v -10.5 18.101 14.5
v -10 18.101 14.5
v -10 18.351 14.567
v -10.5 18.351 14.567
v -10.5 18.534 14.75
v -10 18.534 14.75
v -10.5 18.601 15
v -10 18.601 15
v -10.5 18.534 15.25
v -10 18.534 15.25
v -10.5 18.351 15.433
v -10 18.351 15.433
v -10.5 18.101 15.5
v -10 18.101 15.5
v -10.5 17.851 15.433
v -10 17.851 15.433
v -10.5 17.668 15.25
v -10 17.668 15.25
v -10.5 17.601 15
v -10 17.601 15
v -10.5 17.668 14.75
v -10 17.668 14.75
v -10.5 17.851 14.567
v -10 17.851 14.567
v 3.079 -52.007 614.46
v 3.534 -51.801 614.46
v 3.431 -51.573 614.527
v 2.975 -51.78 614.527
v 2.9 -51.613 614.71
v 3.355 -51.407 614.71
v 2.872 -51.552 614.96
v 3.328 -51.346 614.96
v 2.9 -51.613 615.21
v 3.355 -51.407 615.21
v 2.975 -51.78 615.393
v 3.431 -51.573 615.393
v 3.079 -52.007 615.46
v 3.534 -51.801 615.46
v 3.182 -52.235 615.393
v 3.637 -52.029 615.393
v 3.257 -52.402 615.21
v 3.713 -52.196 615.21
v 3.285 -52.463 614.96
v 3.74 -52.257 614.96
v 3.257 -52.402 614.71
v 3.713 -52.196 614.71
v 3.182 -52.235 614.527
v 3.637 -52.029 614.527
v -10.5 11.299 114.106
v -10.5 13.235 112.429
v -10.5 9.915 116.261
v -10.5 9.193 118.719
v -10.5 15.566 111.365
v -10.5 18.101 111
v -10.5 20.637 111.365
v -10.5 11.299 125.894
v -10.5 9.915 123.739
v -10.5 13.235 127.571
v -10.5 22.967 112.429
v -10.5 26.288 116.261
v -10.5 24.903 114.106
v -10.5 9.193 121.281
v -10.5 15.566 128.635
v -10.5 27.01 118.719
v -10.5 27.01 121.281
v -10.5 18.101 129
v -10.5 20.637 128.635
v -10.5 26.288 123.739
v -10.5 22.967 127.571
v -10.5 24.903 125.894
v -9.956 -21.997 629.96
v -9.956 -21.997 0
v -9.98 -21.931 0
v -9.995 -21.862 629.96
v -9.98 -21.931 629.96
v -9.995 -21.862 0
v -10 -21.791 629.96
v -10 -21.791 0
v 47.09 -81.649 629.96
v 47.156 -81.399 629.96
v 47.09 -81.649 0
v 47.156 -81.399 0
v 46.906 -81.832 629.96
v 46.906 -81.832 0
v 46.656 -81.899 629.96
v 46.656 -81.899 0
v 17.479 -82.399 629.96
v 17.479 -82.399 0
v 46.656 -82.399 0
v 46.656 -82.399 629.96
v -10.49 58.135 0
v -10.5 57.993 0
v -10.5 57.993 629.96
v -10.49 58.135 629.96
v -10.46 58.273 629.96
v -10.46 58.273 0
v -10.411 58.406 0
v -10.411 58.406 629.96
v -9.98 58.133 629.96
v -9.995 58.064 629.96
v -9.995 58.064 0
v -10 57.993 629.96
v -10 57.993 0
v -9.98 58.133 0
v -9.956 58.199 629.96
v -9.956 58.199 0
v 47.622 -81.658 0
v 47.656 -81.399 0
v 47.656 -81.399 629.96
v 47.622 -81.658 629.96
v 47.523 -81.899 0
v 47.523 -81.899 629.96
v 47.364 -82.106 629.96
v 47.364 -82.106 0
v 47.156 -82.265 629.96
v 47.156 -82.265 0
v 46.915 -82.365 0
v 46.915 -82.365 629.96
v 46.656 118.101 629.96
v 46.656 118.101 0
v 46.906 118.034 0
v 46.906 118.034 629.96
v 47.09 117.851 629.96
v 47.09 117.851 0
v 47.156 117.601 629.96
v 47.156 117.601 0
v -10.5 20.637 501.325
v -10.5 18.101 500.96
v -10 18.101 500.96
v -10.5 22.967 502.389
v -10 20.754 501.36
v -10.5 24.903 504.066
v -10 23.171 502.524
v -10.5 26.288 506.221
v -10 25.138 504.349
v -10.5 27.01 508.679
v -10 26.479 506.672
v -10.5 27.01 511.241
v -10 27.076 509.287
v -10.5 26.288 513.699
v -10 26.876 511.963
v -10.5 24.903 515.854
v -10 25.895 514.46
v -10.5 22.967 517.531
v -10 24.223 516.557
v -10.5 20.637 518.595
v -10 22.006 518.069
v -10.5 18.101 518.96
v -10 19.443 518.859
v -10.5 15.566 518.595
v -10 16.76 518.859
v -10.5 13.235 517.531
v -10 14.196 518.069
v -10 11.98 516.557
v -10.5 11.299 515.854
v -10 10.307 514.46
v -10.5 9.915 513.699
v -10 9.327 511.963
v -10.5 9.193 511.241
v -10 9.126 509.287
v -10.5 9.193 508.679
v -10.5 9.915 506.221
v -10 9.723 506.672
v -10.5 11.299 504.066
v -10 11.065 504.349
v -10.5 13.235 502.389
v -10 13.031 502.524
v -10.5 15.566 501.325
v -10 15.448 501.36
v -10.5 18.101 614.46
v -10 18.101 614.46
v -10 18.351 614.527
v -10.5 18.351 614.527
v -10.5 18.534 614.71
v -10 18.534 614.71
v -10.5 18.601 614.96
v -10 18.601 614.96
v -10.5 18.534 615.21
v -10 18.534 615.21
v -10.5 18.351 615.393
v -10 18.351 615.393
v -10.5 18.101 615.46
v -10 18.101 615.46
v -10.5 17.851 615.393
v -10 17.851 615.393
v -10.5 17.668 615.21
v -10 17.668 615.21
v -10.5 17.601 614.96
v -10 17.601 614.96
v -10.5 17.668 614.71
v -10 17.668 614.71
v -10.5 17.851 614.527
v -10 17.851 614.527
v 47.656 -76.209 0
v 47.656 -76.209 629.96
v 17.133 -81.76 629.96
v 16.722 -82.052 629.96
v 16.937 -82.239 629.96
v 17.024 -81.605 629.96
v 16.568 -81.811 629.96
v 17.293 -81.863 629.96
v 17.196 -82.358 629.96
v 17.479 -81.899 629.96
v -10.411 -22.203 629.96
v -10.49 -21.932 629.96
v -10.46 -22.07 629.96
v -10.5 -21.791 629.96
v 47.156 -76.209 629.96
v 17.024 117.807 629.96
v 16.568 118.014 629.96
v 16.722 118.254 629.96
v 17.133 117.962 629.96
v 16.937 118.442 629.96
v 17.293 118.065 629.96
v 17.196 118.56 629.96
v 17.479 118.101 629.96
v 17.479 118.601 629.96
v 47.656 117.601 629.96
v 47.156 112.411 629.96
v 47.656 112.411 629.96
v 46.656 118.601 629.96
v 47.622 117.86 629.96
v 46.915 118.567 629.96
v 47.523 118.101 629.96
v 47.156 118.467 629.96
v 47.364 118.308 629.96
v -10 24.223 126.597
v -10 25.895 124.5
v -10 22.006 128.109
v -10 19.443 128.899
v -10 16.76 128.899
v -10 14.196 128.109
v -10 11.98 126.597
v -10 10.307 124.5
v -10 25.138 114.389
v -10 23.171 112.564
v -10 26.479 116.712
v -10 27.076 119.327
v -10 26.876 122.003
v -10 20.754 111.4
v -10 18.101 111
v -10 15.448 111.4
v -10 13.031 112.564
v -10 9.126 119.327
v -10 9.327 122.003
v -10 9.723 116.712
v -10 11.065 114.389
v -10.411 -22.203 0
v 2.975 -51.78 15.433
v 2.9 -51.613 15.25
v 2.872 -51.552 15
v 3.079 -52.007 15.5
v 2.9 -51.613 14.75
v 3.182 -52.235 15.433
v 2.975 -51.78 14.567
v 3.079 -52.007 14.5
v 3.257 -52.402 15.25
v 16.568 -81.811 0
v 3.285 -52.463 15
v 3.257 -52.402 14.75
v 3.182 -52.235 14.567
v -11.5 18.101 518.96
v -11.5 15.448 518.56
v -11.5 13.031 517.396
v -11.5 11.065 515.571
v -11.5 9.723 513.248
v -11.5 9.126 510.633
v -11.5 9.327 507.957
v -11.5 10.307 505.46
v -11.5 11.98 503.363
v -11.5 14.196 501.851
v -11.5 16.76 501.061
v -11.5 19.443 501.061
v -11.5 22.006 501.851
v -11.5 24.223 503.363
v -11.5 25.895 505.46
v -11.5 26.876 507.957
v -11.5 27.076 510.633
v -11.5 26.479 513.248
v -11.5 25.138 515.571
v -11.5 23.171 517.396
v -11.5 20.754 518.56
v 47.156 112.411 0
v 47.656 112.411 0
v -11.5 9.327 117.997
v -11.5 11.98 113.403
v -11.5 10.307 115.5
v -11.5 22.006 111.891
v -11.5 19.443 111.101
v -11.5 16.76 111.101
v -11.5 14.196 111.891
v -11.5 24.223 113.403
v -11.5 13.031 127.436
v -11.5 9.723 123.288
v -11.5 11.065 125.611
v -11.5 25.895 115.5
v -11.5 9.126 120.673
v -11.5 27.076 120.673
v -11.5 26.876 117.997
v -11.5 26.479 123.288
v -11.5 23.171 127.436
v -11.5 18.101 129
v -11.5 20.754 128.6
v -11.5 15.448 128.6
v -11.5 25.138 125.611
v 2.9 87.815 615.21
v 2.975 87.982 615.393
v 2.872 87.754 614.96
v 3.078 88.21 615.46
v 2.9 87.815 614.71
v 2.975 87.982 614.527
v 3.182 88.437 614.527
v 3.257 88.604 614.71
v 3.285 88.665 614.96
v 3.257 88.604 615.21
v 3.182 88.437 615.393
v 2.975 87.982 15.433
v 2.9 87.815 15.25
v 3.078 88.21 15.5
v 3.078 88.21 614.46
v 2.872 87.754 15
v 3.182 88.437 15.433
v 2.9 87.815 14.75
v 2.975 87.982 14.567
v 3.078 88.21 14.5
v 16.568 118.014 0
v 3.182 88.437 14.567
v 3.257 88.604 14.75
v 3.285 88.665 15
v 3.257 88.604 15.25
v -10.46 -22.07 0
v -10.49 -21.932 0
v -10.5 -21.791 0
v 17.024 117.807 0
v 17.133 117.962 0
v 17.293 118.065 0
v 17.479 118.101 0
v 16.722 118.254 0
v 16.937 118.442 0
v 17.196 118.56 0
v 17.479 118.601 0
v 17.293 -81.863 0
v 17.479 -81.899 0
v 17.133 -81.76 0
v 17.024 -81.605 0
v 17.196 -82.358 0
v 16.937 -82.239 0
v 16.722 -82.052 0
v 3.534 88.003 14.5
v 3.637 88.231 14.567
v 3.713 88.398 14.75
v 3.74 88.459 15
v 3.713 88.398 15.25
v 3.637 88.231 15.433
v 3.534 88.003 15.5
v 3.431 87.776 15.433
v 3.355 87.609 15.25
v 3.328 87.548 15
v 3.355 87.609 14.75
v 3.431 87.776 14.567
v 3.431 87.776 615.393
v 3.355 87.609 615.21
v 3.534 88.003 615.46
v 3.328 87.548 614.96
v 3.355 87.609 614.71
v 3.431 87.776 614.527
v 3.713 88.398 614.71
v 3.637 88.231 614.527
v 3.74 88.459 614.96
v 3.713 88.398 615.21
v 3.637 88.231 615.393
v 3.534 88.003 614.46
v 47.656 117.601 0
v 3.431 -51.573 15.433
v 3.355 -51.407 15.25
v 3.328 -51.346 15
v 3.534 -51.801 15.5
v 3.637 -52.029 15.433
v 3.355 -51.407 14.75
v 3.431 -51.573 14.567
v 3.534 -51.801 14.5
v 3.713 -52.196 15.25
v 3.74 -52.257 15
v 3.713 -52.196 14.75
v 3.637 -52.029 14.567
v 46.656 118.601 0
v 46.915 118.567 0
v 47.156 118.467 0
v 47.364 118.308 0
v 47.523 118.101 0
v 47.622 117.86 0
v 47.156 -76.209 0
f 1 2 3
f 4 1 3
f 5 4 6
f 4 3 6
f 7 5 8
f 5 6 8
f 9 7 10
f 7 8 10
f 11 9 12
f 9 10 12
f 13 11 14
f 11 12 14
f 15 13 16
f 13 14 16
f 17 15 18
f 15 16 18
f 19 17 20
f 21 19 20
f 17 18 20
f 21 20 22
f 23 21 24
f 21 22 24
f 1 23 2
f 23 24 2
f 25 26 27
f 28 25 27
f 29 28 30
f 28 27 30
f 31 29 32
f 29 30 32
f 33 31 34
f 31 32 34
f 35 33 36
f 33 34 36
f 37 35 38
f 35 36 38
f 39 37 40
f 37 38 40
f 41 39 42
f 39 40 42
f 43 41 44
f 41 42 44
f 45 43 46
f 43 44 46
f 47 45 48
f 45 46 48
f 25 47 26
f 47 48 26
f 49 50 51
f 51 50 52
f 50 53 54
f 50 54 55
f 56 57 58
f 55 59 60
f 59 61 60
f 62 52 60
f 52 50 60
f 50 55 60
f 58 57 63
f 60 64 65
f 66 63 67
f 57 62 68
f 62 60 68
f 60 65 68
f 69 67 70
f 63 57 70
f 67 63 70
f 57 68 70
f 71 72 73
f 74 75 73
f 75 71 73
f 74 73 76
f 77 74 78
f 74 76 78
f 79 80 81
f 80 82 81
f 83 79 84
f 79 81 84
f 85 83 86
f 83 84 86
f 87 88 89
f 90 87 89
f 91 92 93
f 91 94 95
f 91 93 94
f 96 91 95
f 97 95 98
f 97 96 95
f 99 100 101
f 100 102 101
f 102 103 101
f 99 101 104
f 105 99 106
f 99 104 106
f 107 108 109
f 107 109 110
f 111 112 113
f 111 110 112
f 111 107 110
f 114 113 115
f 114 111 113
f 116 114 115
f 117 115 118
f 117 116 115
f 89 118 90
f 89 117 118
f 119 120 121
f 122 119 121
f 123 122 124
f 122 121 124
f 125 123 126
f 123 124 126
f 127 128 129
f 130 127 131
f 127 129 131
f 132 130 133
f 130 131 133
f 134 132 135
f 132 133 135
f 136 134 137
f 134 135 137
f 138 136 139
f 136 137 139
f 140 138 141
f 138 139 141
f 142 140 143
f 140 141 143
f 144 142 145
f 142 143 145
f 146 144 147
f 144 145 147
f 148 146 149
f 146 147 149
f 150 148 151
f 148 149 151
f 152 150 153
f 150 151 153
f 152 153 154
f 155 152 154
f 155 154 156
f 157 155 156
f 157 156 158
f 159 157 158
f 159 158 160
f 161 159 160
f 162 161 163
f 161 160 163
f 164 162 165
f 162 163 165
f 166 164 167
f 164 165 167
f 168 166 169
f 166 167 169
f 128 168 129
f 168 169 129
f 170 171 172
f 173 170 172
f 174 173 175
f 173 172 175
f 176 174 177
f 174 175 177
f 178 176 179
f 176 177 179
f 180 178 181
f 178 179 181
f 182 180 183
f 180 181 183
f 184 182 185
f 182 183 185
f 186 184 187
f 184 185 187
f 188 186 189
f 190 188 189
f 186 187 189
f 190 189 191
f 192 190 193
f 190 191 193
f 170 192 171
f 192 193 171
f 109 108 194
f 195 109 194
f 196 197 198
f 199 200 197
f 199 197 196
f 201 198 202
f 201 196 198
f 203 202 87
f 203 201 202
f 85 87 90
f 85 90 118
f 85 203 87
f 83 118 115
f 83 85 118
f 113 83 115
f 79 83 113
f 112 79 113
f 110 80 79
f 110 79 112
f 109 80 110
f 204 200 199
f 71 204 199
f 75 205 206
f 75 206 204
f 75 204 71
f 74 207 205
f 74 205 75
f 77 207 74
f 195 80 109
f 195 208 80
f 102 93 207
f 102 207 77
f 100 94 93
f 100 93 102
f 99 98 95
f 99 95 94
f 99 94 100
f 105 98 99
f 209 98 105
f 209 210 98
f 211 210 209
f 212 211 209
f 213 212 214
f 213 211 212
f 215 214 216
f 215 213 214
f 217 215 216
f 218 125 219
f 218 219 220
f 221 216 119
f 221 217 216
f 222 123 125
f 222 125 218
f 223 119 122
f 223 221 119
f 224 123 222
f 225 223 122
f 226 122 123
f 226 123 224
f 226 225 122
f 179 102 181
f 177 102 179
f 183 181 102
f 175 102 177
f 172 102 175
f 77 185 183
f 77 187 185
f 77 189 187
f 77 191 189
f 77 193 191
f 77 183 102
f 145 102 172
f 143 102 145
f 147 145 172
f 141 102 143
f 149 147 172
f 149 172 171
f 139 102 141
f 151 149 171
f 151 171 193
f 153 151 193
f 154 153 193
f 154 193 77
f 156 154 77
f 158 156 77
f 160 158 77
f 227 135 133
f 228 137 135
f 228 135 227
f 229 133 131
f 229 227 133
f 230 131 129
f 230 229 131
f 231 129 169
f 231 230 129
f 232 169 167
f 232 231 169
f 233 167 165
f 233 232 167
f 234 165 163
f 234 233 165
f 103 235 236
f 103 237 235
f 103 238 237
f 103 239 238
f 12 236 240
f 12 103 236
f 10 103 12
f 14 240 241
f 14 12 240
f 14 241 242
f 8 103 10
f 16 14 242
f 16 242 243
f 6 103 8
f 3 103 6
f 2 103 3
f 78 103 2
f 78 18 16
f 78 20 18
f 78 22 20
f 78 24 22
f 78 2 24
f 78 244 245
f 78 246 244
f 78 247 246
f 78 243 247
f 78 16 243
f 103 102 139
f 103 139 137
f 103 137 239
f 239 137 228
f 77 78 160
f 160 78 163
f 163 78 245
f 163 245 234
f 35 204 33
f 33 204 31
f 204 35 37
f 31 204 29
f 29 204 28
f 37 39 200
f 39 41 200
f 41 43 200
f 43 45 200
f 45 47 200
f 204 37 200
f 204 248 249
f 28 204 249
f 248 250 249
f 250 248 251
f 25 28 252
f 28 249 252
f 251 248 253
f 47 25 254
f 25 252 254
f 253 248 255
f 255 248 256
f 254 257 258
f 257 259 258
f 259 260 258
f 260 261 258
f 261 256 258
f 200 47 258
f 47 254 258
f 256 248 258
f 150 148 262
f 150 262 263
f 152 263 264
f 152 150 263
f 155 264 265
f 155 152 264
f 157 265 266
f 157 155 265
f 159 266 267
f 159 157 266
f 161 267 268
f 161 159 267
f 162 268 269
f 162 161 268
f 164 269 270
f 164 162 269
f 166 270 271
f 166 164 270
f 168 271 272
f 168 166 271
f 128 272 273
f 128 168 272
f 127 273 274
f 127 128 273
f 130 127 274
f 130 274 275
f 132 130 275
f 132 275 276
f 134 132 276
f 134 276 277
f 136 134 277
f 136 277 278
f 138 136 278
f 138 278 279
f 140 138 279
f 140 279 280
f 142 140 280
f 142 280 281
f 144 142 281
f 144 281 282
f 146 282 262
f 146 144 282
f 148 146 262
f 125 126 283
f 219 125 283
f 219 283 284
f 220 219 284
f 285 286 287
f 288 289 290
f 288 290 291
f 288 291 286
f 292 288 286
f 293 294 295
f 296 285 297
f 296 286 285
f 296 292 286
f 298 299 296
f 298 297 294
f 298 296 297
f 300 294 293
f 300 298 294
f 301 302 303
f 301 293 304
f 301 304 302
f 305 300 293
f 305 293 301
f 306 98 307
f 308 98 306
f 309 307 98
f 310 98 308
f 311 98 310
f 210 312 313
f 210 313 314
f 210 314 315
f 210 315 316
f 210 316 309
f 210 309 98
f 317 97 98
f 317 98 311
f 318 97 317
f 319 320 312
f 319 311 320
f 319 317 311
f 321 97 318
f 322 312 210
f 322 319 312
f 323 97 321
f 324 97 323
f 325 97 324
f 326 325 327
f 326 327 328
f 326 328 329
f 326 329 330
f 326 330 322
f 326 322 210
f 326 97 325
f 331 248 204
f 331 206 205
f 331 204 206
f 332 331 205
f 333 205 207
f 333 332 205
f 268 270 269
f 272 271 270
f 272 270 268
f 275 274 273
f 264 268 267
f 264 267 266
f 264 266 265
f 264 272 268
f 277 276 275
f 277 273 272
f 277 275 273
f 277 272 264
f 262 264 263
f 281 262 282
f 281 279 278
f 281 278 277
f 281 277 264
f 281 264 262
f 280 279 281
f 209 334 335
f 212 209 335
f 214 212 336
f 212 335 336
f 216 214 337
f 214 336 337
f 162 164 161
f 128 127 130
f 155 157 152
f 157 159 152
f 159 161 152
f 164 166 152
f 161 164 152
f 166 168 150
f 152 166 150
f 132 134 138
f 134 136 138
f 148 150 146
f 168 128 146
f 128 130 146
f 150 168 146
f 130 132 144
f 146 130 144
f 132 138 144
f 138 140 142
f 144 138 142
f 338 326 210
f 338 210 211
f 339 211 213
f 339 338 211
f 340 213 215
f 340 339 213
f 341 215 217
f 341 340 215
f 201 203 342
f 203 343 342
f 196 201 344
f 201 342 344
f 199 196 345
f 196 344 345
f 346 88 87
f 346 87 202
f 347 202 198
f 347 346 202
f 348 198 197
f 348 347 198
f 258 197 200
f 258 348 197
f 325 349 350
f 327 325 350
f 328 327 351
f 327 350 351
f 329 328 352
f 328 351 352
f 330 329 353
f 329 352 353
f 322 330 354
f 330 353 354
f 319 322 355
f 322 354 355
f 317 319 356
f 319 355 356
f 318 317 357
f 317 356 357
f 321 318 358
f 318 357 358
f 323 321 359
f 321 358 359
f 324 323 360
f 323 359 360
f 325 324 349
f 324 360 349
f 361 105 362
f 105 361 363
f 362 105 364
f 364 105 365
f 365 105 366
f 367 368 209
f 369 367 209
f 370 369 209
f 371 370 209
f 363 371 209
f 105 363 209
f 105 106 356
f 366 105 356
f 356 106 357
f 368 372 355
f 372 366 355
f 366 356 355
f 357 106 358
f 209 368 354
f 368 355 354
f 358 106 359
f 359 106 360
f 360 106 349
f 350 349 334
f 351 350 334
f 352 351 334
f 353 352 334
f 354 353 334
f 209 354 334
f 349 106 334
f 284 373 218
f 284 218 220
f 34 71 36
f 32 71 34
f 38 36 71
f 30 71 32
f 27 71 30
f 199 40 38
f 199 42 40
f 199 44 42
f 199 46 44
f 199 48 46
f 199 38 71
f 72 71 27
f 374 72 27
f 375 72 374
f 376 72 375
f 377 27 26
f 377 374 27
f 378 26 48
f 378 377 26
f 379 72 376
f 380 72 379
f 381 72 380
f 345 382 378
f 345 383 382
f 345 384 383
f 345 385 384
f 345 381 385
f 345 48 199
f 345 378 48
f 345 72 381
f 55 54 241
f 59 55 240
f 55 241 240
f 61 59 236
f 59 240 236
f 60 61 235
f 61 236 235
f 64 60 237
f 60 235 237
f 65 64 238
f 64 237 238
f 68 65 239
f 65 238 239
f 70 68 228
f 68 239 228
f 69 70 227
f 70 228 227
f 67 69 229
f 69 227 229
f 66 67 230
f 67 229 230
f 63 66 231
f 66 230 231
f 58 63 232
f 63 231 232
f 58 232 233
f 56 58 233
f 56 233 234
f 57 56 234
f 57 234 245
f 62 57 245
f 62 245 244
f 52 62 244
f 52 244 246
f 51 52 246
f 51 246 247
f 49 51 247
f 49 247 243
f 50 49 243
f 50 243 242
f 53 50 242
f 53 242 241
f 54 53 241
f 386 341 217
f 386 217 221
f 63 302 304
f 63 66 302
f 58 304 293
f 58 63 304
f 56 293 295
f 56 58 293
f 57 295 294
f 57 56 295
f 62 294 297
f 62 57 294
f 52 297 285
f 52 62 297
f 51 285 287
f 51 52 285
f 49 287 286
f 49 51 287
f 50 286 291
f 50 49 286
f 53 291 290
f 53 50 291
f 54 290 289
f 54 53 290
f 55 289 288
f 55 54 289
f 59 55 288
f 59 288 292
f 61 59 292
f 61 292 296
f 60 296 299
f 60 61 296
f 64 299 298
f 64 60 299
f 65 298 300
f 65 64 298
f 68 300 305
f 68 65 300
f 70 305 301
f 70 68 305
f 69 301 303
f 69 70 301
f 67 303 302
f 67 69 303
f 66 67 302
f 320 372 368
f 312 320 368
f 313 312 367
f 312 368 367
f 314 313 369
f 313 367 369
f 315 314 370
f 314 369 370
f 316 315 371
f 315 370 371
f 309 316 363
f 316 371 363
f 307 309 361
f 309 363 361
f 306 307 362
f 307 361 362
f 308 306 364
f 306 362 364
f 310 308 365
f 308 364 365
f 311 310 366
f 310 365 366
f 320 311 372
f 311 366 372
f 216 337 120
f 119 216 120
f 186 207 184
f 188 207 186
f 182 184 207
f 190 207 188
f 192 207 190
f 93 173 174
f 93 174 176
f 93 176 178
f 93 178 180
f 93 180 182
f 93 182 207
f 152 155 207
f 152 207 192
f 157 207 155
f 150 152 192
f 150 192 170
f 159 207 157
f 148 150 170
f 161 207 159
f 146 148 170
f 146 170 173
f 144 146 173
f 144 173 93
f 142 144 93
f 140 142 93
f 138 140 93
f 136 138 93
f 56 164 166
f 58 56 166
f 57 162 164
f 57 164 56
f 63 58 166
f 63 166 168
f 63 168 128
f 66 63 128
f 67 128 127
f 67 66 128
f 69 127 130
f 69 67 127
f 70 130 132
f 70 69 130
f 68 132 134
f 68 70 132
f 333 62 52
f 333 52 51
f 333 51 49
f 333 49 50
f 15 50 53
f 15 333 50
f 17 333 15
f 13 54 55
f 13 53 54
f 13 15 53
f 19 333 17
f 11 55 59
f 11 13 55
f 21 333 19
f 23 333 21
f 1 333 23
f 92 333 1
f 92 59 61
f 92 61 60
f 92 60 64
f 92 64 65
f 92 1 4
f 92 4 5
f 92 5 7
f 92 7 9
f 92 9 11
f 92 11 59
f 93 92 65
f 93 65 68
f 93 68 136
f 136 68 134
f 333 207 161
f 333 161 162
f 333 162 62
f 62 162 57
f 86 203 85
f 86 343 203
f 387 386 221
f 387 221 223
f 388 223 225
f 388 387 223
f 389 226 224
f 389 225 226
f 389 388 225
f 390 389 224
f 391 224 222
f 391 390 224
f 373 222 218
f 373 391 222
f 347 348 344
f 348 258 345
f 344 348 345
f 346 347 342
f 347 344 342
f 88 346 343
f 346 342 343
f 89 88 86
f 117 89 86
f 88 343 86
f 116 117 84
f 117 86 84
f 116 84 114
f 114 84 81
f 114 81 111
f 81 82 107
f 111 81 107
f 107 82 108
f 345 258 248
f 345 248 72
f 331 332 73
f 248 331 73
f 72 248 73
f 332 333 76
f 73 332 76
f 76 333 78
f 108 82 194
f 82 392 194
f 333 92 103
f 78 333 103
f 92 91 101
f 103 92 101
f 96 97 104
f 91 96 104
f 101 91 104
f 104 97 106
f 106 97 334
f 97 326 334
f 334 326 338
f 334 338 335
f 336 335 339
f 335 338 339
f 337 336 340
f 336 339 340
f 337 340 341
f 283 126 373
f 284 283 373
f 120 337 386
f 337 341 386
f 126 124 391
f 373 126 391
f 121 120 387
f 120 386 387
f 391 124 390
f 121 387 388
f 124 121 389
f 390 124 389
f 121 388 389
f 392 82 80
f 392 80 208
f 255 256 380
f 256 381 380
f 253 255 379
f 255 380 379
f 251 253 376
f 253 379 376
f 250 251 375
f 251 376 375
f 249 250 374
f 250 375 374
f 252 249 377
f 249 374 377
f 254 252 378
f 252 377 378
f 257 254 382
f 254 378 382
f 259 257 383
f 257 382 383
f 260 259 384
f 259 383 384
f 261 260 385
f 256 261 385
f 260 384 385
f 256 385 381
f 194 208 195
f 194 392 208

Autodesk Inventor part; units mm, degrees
ref_plane "YZ Plane" through (0, 0, 0) normal (1, 0, 0) x (0, 1, 0)
ref_plane "XZ Plane" through (0, 0, 0) normal (0, 1, 0) x (-1, 0, 0)
ref_plane "XY Plane" through (0, 0, 0) normal (0, 0, 1) x (1, 0, 0)
sketch "Boceto1" plane through (0, 0, 0) normal (0, 0, 1) x (1, 0, 0)
  line L0 (-10, 6.5506) -> (-10, 58.1012)
  line L1 (-10, 58.1012) -> (17.1565, 118.1012)
  line L2 (17.1565, 118.1012) -> (47.1565, 118.1012)
  line L3 (47.1565, 118.1012) -> (47.1565, 112.4113)
  line L4 (-10, 6.5506) -> (-10, -21.8988)
  line L5 (-10, -21.8988) -> (17.1565, -81.8988)
  line L6 (17.1565, -81.8988) -> (47.1565, -81.8988)
  line L7 (47.1565, -81.8988) -> (47.1565, -76.2089)
  point P0 (47.1565, 115.2562)
  dimension "d22" = 60
  dimension "d23" = 60
  dimension "d24" = 30
  dimension "d25" = 30
  dimension "d26" = 200
  dimension "d44" = 57.1565
contour flange "Pestaña de contorno1" sketch "Boceto1" thickness 0.5 bend radius 0.5 width 629.96 along (0, 0, 1) mid plane no both sides no wall seen from (47.1565, 115.2562, 0) lies toward (1, 0, 0) curves L3 L2 L1 L0 L4 L5 L6 L7
bend "Doblez1"
corner "Esquina1"
sketch "Boceto2" plane through (-10, -21.7909, 629.96) normal (1, 0, 0) x (0, 0, -1)
  circle A0 centre (614.96, 39.8921) radius 0.5
  line L0 (629.96, 79.7842) -> (629.96, 0) projected
  circle A1 centre (15, 39.8921) radius 0.5
  line L1 (0, 0) -> (0, 79.7842) projected
  circle A2 centre (120, 39.8921) radius 9
  circle A3 centre (509.96, 39.8921) radius 9
  point P0 (629.96, 21.7909)
  point P1 (0, 39.8921)
  point P2 (629.96, 39.8921)
  dimension "d16" = 1
  dimension "d17" = 15
  dimension "d18" = 1
  dimension "d19" = 15
  dimension "d27" = 0
  dimension "d40" = 18
  dimension "d41" = 18
  dimension "d42" = 120
  dimension "d43" = 120
extrude "Extrusión1" cut sketch "Boceto2" against normal blind 10
sketch "Boceto3" plane through (-9.9555, 58.1995, 629.96) normal (0.9110302, -0.4123397, 0) x (0, 0, -1)
  circle A0 centre (15, 32.7145) radius 0.5
  line L0 (0, 0) -> (0, 65.4291) projected
  circle A1 centre (614.96, 32.7145) radius 0.5
  line L1 (629.96, 65.4291) -> (629.96, 0) projected
  point P0 (629.96, -48.9164)
  dimension "d28" = 1
  dimension "d29" = 15
  dimension "d30" = 1
  dimension "d31" = 15
extrude "Extrusión2" cut sketch "Boceto3" against normal blind 4.25
sketch "Boceto4" plane through (17.0235, -81.605, 629.96) normal (0.9110302, 0.4123397, 0) x (0, 0, -1)
  circle A0 centre (15, 32.7145) radius 0.5
  line L0 (0, 0) -> (0, 65.4291) projected
  circle A1 centre (614.96, 32.7145) radius 0.5
  line L1 (629.96, 65.4291) -> (629.96, 0) projected
  point P0 (629.96, 81.3641)
  point P1 (0, 32.7145)
  dimension "d34" = 1
  dimension "d35" = 15
  dimension "d36" = 1
  dimension "d37" = 15
extrude "Extrusión3" cut sketch "Boceto4" against normal blind 6
sketch "Boceto6" plane through (-10.5, -21.7909, 0) normal (-1, 0, 0) x (0, 0, 1)
  circle A0 centre (120, 39.8921) radius 9 projected
  circle A1 centre (120, 39.8921) radius 9
  circle A2 centre (509.96, 39.8921) radius 9 projected
  circle A3 centre (509.96, 39.8921) radius 9
  point P0 (0, 21.7909)
extrude "Extrusión4" add sketch "Boceto6" along normal blind 1
equation "\"d5\" = Grosor"
equation "\"d6\" = Anchura_desahogo_plegado"
equation "\"d7\" = Profundidad_desahogo_plegado"
equation "\"d8\" = Remanente_mínimo"
equation "\"d9\" = Radiodetransición"
equation "\"d11\" = Radio_pliegue"
equation "\"d13\" = Tamaño_destalonado"
equation "\"d14\" = TamañoSeparación"
equation "\"d15\" = Tamaño_de_radio_de_Jacobi"
equation "\"Radio_pliegue\" = Grosor"
equation "\"Remanente_mínimo\" = 2 * Grosor"
equation "\"TamañoSeparación\" = Grosor"
equation "\"Radiodetransición\" = Radio_pliegue"
equation "\"Tamaño_destalonado\" = 4 * Grosor"
equation "\"Anchura_desahogo_plegado\" = Grosor"
equation "\"Tamaño_de_radio_de_Jacobi\" = Radio_pliegue"
equation "\"Profundidad_desahogo_plegado\" = 0.5 * Grosor"
equation "\"Grosor\" = 0.5"
properties part number "Carcasa"
